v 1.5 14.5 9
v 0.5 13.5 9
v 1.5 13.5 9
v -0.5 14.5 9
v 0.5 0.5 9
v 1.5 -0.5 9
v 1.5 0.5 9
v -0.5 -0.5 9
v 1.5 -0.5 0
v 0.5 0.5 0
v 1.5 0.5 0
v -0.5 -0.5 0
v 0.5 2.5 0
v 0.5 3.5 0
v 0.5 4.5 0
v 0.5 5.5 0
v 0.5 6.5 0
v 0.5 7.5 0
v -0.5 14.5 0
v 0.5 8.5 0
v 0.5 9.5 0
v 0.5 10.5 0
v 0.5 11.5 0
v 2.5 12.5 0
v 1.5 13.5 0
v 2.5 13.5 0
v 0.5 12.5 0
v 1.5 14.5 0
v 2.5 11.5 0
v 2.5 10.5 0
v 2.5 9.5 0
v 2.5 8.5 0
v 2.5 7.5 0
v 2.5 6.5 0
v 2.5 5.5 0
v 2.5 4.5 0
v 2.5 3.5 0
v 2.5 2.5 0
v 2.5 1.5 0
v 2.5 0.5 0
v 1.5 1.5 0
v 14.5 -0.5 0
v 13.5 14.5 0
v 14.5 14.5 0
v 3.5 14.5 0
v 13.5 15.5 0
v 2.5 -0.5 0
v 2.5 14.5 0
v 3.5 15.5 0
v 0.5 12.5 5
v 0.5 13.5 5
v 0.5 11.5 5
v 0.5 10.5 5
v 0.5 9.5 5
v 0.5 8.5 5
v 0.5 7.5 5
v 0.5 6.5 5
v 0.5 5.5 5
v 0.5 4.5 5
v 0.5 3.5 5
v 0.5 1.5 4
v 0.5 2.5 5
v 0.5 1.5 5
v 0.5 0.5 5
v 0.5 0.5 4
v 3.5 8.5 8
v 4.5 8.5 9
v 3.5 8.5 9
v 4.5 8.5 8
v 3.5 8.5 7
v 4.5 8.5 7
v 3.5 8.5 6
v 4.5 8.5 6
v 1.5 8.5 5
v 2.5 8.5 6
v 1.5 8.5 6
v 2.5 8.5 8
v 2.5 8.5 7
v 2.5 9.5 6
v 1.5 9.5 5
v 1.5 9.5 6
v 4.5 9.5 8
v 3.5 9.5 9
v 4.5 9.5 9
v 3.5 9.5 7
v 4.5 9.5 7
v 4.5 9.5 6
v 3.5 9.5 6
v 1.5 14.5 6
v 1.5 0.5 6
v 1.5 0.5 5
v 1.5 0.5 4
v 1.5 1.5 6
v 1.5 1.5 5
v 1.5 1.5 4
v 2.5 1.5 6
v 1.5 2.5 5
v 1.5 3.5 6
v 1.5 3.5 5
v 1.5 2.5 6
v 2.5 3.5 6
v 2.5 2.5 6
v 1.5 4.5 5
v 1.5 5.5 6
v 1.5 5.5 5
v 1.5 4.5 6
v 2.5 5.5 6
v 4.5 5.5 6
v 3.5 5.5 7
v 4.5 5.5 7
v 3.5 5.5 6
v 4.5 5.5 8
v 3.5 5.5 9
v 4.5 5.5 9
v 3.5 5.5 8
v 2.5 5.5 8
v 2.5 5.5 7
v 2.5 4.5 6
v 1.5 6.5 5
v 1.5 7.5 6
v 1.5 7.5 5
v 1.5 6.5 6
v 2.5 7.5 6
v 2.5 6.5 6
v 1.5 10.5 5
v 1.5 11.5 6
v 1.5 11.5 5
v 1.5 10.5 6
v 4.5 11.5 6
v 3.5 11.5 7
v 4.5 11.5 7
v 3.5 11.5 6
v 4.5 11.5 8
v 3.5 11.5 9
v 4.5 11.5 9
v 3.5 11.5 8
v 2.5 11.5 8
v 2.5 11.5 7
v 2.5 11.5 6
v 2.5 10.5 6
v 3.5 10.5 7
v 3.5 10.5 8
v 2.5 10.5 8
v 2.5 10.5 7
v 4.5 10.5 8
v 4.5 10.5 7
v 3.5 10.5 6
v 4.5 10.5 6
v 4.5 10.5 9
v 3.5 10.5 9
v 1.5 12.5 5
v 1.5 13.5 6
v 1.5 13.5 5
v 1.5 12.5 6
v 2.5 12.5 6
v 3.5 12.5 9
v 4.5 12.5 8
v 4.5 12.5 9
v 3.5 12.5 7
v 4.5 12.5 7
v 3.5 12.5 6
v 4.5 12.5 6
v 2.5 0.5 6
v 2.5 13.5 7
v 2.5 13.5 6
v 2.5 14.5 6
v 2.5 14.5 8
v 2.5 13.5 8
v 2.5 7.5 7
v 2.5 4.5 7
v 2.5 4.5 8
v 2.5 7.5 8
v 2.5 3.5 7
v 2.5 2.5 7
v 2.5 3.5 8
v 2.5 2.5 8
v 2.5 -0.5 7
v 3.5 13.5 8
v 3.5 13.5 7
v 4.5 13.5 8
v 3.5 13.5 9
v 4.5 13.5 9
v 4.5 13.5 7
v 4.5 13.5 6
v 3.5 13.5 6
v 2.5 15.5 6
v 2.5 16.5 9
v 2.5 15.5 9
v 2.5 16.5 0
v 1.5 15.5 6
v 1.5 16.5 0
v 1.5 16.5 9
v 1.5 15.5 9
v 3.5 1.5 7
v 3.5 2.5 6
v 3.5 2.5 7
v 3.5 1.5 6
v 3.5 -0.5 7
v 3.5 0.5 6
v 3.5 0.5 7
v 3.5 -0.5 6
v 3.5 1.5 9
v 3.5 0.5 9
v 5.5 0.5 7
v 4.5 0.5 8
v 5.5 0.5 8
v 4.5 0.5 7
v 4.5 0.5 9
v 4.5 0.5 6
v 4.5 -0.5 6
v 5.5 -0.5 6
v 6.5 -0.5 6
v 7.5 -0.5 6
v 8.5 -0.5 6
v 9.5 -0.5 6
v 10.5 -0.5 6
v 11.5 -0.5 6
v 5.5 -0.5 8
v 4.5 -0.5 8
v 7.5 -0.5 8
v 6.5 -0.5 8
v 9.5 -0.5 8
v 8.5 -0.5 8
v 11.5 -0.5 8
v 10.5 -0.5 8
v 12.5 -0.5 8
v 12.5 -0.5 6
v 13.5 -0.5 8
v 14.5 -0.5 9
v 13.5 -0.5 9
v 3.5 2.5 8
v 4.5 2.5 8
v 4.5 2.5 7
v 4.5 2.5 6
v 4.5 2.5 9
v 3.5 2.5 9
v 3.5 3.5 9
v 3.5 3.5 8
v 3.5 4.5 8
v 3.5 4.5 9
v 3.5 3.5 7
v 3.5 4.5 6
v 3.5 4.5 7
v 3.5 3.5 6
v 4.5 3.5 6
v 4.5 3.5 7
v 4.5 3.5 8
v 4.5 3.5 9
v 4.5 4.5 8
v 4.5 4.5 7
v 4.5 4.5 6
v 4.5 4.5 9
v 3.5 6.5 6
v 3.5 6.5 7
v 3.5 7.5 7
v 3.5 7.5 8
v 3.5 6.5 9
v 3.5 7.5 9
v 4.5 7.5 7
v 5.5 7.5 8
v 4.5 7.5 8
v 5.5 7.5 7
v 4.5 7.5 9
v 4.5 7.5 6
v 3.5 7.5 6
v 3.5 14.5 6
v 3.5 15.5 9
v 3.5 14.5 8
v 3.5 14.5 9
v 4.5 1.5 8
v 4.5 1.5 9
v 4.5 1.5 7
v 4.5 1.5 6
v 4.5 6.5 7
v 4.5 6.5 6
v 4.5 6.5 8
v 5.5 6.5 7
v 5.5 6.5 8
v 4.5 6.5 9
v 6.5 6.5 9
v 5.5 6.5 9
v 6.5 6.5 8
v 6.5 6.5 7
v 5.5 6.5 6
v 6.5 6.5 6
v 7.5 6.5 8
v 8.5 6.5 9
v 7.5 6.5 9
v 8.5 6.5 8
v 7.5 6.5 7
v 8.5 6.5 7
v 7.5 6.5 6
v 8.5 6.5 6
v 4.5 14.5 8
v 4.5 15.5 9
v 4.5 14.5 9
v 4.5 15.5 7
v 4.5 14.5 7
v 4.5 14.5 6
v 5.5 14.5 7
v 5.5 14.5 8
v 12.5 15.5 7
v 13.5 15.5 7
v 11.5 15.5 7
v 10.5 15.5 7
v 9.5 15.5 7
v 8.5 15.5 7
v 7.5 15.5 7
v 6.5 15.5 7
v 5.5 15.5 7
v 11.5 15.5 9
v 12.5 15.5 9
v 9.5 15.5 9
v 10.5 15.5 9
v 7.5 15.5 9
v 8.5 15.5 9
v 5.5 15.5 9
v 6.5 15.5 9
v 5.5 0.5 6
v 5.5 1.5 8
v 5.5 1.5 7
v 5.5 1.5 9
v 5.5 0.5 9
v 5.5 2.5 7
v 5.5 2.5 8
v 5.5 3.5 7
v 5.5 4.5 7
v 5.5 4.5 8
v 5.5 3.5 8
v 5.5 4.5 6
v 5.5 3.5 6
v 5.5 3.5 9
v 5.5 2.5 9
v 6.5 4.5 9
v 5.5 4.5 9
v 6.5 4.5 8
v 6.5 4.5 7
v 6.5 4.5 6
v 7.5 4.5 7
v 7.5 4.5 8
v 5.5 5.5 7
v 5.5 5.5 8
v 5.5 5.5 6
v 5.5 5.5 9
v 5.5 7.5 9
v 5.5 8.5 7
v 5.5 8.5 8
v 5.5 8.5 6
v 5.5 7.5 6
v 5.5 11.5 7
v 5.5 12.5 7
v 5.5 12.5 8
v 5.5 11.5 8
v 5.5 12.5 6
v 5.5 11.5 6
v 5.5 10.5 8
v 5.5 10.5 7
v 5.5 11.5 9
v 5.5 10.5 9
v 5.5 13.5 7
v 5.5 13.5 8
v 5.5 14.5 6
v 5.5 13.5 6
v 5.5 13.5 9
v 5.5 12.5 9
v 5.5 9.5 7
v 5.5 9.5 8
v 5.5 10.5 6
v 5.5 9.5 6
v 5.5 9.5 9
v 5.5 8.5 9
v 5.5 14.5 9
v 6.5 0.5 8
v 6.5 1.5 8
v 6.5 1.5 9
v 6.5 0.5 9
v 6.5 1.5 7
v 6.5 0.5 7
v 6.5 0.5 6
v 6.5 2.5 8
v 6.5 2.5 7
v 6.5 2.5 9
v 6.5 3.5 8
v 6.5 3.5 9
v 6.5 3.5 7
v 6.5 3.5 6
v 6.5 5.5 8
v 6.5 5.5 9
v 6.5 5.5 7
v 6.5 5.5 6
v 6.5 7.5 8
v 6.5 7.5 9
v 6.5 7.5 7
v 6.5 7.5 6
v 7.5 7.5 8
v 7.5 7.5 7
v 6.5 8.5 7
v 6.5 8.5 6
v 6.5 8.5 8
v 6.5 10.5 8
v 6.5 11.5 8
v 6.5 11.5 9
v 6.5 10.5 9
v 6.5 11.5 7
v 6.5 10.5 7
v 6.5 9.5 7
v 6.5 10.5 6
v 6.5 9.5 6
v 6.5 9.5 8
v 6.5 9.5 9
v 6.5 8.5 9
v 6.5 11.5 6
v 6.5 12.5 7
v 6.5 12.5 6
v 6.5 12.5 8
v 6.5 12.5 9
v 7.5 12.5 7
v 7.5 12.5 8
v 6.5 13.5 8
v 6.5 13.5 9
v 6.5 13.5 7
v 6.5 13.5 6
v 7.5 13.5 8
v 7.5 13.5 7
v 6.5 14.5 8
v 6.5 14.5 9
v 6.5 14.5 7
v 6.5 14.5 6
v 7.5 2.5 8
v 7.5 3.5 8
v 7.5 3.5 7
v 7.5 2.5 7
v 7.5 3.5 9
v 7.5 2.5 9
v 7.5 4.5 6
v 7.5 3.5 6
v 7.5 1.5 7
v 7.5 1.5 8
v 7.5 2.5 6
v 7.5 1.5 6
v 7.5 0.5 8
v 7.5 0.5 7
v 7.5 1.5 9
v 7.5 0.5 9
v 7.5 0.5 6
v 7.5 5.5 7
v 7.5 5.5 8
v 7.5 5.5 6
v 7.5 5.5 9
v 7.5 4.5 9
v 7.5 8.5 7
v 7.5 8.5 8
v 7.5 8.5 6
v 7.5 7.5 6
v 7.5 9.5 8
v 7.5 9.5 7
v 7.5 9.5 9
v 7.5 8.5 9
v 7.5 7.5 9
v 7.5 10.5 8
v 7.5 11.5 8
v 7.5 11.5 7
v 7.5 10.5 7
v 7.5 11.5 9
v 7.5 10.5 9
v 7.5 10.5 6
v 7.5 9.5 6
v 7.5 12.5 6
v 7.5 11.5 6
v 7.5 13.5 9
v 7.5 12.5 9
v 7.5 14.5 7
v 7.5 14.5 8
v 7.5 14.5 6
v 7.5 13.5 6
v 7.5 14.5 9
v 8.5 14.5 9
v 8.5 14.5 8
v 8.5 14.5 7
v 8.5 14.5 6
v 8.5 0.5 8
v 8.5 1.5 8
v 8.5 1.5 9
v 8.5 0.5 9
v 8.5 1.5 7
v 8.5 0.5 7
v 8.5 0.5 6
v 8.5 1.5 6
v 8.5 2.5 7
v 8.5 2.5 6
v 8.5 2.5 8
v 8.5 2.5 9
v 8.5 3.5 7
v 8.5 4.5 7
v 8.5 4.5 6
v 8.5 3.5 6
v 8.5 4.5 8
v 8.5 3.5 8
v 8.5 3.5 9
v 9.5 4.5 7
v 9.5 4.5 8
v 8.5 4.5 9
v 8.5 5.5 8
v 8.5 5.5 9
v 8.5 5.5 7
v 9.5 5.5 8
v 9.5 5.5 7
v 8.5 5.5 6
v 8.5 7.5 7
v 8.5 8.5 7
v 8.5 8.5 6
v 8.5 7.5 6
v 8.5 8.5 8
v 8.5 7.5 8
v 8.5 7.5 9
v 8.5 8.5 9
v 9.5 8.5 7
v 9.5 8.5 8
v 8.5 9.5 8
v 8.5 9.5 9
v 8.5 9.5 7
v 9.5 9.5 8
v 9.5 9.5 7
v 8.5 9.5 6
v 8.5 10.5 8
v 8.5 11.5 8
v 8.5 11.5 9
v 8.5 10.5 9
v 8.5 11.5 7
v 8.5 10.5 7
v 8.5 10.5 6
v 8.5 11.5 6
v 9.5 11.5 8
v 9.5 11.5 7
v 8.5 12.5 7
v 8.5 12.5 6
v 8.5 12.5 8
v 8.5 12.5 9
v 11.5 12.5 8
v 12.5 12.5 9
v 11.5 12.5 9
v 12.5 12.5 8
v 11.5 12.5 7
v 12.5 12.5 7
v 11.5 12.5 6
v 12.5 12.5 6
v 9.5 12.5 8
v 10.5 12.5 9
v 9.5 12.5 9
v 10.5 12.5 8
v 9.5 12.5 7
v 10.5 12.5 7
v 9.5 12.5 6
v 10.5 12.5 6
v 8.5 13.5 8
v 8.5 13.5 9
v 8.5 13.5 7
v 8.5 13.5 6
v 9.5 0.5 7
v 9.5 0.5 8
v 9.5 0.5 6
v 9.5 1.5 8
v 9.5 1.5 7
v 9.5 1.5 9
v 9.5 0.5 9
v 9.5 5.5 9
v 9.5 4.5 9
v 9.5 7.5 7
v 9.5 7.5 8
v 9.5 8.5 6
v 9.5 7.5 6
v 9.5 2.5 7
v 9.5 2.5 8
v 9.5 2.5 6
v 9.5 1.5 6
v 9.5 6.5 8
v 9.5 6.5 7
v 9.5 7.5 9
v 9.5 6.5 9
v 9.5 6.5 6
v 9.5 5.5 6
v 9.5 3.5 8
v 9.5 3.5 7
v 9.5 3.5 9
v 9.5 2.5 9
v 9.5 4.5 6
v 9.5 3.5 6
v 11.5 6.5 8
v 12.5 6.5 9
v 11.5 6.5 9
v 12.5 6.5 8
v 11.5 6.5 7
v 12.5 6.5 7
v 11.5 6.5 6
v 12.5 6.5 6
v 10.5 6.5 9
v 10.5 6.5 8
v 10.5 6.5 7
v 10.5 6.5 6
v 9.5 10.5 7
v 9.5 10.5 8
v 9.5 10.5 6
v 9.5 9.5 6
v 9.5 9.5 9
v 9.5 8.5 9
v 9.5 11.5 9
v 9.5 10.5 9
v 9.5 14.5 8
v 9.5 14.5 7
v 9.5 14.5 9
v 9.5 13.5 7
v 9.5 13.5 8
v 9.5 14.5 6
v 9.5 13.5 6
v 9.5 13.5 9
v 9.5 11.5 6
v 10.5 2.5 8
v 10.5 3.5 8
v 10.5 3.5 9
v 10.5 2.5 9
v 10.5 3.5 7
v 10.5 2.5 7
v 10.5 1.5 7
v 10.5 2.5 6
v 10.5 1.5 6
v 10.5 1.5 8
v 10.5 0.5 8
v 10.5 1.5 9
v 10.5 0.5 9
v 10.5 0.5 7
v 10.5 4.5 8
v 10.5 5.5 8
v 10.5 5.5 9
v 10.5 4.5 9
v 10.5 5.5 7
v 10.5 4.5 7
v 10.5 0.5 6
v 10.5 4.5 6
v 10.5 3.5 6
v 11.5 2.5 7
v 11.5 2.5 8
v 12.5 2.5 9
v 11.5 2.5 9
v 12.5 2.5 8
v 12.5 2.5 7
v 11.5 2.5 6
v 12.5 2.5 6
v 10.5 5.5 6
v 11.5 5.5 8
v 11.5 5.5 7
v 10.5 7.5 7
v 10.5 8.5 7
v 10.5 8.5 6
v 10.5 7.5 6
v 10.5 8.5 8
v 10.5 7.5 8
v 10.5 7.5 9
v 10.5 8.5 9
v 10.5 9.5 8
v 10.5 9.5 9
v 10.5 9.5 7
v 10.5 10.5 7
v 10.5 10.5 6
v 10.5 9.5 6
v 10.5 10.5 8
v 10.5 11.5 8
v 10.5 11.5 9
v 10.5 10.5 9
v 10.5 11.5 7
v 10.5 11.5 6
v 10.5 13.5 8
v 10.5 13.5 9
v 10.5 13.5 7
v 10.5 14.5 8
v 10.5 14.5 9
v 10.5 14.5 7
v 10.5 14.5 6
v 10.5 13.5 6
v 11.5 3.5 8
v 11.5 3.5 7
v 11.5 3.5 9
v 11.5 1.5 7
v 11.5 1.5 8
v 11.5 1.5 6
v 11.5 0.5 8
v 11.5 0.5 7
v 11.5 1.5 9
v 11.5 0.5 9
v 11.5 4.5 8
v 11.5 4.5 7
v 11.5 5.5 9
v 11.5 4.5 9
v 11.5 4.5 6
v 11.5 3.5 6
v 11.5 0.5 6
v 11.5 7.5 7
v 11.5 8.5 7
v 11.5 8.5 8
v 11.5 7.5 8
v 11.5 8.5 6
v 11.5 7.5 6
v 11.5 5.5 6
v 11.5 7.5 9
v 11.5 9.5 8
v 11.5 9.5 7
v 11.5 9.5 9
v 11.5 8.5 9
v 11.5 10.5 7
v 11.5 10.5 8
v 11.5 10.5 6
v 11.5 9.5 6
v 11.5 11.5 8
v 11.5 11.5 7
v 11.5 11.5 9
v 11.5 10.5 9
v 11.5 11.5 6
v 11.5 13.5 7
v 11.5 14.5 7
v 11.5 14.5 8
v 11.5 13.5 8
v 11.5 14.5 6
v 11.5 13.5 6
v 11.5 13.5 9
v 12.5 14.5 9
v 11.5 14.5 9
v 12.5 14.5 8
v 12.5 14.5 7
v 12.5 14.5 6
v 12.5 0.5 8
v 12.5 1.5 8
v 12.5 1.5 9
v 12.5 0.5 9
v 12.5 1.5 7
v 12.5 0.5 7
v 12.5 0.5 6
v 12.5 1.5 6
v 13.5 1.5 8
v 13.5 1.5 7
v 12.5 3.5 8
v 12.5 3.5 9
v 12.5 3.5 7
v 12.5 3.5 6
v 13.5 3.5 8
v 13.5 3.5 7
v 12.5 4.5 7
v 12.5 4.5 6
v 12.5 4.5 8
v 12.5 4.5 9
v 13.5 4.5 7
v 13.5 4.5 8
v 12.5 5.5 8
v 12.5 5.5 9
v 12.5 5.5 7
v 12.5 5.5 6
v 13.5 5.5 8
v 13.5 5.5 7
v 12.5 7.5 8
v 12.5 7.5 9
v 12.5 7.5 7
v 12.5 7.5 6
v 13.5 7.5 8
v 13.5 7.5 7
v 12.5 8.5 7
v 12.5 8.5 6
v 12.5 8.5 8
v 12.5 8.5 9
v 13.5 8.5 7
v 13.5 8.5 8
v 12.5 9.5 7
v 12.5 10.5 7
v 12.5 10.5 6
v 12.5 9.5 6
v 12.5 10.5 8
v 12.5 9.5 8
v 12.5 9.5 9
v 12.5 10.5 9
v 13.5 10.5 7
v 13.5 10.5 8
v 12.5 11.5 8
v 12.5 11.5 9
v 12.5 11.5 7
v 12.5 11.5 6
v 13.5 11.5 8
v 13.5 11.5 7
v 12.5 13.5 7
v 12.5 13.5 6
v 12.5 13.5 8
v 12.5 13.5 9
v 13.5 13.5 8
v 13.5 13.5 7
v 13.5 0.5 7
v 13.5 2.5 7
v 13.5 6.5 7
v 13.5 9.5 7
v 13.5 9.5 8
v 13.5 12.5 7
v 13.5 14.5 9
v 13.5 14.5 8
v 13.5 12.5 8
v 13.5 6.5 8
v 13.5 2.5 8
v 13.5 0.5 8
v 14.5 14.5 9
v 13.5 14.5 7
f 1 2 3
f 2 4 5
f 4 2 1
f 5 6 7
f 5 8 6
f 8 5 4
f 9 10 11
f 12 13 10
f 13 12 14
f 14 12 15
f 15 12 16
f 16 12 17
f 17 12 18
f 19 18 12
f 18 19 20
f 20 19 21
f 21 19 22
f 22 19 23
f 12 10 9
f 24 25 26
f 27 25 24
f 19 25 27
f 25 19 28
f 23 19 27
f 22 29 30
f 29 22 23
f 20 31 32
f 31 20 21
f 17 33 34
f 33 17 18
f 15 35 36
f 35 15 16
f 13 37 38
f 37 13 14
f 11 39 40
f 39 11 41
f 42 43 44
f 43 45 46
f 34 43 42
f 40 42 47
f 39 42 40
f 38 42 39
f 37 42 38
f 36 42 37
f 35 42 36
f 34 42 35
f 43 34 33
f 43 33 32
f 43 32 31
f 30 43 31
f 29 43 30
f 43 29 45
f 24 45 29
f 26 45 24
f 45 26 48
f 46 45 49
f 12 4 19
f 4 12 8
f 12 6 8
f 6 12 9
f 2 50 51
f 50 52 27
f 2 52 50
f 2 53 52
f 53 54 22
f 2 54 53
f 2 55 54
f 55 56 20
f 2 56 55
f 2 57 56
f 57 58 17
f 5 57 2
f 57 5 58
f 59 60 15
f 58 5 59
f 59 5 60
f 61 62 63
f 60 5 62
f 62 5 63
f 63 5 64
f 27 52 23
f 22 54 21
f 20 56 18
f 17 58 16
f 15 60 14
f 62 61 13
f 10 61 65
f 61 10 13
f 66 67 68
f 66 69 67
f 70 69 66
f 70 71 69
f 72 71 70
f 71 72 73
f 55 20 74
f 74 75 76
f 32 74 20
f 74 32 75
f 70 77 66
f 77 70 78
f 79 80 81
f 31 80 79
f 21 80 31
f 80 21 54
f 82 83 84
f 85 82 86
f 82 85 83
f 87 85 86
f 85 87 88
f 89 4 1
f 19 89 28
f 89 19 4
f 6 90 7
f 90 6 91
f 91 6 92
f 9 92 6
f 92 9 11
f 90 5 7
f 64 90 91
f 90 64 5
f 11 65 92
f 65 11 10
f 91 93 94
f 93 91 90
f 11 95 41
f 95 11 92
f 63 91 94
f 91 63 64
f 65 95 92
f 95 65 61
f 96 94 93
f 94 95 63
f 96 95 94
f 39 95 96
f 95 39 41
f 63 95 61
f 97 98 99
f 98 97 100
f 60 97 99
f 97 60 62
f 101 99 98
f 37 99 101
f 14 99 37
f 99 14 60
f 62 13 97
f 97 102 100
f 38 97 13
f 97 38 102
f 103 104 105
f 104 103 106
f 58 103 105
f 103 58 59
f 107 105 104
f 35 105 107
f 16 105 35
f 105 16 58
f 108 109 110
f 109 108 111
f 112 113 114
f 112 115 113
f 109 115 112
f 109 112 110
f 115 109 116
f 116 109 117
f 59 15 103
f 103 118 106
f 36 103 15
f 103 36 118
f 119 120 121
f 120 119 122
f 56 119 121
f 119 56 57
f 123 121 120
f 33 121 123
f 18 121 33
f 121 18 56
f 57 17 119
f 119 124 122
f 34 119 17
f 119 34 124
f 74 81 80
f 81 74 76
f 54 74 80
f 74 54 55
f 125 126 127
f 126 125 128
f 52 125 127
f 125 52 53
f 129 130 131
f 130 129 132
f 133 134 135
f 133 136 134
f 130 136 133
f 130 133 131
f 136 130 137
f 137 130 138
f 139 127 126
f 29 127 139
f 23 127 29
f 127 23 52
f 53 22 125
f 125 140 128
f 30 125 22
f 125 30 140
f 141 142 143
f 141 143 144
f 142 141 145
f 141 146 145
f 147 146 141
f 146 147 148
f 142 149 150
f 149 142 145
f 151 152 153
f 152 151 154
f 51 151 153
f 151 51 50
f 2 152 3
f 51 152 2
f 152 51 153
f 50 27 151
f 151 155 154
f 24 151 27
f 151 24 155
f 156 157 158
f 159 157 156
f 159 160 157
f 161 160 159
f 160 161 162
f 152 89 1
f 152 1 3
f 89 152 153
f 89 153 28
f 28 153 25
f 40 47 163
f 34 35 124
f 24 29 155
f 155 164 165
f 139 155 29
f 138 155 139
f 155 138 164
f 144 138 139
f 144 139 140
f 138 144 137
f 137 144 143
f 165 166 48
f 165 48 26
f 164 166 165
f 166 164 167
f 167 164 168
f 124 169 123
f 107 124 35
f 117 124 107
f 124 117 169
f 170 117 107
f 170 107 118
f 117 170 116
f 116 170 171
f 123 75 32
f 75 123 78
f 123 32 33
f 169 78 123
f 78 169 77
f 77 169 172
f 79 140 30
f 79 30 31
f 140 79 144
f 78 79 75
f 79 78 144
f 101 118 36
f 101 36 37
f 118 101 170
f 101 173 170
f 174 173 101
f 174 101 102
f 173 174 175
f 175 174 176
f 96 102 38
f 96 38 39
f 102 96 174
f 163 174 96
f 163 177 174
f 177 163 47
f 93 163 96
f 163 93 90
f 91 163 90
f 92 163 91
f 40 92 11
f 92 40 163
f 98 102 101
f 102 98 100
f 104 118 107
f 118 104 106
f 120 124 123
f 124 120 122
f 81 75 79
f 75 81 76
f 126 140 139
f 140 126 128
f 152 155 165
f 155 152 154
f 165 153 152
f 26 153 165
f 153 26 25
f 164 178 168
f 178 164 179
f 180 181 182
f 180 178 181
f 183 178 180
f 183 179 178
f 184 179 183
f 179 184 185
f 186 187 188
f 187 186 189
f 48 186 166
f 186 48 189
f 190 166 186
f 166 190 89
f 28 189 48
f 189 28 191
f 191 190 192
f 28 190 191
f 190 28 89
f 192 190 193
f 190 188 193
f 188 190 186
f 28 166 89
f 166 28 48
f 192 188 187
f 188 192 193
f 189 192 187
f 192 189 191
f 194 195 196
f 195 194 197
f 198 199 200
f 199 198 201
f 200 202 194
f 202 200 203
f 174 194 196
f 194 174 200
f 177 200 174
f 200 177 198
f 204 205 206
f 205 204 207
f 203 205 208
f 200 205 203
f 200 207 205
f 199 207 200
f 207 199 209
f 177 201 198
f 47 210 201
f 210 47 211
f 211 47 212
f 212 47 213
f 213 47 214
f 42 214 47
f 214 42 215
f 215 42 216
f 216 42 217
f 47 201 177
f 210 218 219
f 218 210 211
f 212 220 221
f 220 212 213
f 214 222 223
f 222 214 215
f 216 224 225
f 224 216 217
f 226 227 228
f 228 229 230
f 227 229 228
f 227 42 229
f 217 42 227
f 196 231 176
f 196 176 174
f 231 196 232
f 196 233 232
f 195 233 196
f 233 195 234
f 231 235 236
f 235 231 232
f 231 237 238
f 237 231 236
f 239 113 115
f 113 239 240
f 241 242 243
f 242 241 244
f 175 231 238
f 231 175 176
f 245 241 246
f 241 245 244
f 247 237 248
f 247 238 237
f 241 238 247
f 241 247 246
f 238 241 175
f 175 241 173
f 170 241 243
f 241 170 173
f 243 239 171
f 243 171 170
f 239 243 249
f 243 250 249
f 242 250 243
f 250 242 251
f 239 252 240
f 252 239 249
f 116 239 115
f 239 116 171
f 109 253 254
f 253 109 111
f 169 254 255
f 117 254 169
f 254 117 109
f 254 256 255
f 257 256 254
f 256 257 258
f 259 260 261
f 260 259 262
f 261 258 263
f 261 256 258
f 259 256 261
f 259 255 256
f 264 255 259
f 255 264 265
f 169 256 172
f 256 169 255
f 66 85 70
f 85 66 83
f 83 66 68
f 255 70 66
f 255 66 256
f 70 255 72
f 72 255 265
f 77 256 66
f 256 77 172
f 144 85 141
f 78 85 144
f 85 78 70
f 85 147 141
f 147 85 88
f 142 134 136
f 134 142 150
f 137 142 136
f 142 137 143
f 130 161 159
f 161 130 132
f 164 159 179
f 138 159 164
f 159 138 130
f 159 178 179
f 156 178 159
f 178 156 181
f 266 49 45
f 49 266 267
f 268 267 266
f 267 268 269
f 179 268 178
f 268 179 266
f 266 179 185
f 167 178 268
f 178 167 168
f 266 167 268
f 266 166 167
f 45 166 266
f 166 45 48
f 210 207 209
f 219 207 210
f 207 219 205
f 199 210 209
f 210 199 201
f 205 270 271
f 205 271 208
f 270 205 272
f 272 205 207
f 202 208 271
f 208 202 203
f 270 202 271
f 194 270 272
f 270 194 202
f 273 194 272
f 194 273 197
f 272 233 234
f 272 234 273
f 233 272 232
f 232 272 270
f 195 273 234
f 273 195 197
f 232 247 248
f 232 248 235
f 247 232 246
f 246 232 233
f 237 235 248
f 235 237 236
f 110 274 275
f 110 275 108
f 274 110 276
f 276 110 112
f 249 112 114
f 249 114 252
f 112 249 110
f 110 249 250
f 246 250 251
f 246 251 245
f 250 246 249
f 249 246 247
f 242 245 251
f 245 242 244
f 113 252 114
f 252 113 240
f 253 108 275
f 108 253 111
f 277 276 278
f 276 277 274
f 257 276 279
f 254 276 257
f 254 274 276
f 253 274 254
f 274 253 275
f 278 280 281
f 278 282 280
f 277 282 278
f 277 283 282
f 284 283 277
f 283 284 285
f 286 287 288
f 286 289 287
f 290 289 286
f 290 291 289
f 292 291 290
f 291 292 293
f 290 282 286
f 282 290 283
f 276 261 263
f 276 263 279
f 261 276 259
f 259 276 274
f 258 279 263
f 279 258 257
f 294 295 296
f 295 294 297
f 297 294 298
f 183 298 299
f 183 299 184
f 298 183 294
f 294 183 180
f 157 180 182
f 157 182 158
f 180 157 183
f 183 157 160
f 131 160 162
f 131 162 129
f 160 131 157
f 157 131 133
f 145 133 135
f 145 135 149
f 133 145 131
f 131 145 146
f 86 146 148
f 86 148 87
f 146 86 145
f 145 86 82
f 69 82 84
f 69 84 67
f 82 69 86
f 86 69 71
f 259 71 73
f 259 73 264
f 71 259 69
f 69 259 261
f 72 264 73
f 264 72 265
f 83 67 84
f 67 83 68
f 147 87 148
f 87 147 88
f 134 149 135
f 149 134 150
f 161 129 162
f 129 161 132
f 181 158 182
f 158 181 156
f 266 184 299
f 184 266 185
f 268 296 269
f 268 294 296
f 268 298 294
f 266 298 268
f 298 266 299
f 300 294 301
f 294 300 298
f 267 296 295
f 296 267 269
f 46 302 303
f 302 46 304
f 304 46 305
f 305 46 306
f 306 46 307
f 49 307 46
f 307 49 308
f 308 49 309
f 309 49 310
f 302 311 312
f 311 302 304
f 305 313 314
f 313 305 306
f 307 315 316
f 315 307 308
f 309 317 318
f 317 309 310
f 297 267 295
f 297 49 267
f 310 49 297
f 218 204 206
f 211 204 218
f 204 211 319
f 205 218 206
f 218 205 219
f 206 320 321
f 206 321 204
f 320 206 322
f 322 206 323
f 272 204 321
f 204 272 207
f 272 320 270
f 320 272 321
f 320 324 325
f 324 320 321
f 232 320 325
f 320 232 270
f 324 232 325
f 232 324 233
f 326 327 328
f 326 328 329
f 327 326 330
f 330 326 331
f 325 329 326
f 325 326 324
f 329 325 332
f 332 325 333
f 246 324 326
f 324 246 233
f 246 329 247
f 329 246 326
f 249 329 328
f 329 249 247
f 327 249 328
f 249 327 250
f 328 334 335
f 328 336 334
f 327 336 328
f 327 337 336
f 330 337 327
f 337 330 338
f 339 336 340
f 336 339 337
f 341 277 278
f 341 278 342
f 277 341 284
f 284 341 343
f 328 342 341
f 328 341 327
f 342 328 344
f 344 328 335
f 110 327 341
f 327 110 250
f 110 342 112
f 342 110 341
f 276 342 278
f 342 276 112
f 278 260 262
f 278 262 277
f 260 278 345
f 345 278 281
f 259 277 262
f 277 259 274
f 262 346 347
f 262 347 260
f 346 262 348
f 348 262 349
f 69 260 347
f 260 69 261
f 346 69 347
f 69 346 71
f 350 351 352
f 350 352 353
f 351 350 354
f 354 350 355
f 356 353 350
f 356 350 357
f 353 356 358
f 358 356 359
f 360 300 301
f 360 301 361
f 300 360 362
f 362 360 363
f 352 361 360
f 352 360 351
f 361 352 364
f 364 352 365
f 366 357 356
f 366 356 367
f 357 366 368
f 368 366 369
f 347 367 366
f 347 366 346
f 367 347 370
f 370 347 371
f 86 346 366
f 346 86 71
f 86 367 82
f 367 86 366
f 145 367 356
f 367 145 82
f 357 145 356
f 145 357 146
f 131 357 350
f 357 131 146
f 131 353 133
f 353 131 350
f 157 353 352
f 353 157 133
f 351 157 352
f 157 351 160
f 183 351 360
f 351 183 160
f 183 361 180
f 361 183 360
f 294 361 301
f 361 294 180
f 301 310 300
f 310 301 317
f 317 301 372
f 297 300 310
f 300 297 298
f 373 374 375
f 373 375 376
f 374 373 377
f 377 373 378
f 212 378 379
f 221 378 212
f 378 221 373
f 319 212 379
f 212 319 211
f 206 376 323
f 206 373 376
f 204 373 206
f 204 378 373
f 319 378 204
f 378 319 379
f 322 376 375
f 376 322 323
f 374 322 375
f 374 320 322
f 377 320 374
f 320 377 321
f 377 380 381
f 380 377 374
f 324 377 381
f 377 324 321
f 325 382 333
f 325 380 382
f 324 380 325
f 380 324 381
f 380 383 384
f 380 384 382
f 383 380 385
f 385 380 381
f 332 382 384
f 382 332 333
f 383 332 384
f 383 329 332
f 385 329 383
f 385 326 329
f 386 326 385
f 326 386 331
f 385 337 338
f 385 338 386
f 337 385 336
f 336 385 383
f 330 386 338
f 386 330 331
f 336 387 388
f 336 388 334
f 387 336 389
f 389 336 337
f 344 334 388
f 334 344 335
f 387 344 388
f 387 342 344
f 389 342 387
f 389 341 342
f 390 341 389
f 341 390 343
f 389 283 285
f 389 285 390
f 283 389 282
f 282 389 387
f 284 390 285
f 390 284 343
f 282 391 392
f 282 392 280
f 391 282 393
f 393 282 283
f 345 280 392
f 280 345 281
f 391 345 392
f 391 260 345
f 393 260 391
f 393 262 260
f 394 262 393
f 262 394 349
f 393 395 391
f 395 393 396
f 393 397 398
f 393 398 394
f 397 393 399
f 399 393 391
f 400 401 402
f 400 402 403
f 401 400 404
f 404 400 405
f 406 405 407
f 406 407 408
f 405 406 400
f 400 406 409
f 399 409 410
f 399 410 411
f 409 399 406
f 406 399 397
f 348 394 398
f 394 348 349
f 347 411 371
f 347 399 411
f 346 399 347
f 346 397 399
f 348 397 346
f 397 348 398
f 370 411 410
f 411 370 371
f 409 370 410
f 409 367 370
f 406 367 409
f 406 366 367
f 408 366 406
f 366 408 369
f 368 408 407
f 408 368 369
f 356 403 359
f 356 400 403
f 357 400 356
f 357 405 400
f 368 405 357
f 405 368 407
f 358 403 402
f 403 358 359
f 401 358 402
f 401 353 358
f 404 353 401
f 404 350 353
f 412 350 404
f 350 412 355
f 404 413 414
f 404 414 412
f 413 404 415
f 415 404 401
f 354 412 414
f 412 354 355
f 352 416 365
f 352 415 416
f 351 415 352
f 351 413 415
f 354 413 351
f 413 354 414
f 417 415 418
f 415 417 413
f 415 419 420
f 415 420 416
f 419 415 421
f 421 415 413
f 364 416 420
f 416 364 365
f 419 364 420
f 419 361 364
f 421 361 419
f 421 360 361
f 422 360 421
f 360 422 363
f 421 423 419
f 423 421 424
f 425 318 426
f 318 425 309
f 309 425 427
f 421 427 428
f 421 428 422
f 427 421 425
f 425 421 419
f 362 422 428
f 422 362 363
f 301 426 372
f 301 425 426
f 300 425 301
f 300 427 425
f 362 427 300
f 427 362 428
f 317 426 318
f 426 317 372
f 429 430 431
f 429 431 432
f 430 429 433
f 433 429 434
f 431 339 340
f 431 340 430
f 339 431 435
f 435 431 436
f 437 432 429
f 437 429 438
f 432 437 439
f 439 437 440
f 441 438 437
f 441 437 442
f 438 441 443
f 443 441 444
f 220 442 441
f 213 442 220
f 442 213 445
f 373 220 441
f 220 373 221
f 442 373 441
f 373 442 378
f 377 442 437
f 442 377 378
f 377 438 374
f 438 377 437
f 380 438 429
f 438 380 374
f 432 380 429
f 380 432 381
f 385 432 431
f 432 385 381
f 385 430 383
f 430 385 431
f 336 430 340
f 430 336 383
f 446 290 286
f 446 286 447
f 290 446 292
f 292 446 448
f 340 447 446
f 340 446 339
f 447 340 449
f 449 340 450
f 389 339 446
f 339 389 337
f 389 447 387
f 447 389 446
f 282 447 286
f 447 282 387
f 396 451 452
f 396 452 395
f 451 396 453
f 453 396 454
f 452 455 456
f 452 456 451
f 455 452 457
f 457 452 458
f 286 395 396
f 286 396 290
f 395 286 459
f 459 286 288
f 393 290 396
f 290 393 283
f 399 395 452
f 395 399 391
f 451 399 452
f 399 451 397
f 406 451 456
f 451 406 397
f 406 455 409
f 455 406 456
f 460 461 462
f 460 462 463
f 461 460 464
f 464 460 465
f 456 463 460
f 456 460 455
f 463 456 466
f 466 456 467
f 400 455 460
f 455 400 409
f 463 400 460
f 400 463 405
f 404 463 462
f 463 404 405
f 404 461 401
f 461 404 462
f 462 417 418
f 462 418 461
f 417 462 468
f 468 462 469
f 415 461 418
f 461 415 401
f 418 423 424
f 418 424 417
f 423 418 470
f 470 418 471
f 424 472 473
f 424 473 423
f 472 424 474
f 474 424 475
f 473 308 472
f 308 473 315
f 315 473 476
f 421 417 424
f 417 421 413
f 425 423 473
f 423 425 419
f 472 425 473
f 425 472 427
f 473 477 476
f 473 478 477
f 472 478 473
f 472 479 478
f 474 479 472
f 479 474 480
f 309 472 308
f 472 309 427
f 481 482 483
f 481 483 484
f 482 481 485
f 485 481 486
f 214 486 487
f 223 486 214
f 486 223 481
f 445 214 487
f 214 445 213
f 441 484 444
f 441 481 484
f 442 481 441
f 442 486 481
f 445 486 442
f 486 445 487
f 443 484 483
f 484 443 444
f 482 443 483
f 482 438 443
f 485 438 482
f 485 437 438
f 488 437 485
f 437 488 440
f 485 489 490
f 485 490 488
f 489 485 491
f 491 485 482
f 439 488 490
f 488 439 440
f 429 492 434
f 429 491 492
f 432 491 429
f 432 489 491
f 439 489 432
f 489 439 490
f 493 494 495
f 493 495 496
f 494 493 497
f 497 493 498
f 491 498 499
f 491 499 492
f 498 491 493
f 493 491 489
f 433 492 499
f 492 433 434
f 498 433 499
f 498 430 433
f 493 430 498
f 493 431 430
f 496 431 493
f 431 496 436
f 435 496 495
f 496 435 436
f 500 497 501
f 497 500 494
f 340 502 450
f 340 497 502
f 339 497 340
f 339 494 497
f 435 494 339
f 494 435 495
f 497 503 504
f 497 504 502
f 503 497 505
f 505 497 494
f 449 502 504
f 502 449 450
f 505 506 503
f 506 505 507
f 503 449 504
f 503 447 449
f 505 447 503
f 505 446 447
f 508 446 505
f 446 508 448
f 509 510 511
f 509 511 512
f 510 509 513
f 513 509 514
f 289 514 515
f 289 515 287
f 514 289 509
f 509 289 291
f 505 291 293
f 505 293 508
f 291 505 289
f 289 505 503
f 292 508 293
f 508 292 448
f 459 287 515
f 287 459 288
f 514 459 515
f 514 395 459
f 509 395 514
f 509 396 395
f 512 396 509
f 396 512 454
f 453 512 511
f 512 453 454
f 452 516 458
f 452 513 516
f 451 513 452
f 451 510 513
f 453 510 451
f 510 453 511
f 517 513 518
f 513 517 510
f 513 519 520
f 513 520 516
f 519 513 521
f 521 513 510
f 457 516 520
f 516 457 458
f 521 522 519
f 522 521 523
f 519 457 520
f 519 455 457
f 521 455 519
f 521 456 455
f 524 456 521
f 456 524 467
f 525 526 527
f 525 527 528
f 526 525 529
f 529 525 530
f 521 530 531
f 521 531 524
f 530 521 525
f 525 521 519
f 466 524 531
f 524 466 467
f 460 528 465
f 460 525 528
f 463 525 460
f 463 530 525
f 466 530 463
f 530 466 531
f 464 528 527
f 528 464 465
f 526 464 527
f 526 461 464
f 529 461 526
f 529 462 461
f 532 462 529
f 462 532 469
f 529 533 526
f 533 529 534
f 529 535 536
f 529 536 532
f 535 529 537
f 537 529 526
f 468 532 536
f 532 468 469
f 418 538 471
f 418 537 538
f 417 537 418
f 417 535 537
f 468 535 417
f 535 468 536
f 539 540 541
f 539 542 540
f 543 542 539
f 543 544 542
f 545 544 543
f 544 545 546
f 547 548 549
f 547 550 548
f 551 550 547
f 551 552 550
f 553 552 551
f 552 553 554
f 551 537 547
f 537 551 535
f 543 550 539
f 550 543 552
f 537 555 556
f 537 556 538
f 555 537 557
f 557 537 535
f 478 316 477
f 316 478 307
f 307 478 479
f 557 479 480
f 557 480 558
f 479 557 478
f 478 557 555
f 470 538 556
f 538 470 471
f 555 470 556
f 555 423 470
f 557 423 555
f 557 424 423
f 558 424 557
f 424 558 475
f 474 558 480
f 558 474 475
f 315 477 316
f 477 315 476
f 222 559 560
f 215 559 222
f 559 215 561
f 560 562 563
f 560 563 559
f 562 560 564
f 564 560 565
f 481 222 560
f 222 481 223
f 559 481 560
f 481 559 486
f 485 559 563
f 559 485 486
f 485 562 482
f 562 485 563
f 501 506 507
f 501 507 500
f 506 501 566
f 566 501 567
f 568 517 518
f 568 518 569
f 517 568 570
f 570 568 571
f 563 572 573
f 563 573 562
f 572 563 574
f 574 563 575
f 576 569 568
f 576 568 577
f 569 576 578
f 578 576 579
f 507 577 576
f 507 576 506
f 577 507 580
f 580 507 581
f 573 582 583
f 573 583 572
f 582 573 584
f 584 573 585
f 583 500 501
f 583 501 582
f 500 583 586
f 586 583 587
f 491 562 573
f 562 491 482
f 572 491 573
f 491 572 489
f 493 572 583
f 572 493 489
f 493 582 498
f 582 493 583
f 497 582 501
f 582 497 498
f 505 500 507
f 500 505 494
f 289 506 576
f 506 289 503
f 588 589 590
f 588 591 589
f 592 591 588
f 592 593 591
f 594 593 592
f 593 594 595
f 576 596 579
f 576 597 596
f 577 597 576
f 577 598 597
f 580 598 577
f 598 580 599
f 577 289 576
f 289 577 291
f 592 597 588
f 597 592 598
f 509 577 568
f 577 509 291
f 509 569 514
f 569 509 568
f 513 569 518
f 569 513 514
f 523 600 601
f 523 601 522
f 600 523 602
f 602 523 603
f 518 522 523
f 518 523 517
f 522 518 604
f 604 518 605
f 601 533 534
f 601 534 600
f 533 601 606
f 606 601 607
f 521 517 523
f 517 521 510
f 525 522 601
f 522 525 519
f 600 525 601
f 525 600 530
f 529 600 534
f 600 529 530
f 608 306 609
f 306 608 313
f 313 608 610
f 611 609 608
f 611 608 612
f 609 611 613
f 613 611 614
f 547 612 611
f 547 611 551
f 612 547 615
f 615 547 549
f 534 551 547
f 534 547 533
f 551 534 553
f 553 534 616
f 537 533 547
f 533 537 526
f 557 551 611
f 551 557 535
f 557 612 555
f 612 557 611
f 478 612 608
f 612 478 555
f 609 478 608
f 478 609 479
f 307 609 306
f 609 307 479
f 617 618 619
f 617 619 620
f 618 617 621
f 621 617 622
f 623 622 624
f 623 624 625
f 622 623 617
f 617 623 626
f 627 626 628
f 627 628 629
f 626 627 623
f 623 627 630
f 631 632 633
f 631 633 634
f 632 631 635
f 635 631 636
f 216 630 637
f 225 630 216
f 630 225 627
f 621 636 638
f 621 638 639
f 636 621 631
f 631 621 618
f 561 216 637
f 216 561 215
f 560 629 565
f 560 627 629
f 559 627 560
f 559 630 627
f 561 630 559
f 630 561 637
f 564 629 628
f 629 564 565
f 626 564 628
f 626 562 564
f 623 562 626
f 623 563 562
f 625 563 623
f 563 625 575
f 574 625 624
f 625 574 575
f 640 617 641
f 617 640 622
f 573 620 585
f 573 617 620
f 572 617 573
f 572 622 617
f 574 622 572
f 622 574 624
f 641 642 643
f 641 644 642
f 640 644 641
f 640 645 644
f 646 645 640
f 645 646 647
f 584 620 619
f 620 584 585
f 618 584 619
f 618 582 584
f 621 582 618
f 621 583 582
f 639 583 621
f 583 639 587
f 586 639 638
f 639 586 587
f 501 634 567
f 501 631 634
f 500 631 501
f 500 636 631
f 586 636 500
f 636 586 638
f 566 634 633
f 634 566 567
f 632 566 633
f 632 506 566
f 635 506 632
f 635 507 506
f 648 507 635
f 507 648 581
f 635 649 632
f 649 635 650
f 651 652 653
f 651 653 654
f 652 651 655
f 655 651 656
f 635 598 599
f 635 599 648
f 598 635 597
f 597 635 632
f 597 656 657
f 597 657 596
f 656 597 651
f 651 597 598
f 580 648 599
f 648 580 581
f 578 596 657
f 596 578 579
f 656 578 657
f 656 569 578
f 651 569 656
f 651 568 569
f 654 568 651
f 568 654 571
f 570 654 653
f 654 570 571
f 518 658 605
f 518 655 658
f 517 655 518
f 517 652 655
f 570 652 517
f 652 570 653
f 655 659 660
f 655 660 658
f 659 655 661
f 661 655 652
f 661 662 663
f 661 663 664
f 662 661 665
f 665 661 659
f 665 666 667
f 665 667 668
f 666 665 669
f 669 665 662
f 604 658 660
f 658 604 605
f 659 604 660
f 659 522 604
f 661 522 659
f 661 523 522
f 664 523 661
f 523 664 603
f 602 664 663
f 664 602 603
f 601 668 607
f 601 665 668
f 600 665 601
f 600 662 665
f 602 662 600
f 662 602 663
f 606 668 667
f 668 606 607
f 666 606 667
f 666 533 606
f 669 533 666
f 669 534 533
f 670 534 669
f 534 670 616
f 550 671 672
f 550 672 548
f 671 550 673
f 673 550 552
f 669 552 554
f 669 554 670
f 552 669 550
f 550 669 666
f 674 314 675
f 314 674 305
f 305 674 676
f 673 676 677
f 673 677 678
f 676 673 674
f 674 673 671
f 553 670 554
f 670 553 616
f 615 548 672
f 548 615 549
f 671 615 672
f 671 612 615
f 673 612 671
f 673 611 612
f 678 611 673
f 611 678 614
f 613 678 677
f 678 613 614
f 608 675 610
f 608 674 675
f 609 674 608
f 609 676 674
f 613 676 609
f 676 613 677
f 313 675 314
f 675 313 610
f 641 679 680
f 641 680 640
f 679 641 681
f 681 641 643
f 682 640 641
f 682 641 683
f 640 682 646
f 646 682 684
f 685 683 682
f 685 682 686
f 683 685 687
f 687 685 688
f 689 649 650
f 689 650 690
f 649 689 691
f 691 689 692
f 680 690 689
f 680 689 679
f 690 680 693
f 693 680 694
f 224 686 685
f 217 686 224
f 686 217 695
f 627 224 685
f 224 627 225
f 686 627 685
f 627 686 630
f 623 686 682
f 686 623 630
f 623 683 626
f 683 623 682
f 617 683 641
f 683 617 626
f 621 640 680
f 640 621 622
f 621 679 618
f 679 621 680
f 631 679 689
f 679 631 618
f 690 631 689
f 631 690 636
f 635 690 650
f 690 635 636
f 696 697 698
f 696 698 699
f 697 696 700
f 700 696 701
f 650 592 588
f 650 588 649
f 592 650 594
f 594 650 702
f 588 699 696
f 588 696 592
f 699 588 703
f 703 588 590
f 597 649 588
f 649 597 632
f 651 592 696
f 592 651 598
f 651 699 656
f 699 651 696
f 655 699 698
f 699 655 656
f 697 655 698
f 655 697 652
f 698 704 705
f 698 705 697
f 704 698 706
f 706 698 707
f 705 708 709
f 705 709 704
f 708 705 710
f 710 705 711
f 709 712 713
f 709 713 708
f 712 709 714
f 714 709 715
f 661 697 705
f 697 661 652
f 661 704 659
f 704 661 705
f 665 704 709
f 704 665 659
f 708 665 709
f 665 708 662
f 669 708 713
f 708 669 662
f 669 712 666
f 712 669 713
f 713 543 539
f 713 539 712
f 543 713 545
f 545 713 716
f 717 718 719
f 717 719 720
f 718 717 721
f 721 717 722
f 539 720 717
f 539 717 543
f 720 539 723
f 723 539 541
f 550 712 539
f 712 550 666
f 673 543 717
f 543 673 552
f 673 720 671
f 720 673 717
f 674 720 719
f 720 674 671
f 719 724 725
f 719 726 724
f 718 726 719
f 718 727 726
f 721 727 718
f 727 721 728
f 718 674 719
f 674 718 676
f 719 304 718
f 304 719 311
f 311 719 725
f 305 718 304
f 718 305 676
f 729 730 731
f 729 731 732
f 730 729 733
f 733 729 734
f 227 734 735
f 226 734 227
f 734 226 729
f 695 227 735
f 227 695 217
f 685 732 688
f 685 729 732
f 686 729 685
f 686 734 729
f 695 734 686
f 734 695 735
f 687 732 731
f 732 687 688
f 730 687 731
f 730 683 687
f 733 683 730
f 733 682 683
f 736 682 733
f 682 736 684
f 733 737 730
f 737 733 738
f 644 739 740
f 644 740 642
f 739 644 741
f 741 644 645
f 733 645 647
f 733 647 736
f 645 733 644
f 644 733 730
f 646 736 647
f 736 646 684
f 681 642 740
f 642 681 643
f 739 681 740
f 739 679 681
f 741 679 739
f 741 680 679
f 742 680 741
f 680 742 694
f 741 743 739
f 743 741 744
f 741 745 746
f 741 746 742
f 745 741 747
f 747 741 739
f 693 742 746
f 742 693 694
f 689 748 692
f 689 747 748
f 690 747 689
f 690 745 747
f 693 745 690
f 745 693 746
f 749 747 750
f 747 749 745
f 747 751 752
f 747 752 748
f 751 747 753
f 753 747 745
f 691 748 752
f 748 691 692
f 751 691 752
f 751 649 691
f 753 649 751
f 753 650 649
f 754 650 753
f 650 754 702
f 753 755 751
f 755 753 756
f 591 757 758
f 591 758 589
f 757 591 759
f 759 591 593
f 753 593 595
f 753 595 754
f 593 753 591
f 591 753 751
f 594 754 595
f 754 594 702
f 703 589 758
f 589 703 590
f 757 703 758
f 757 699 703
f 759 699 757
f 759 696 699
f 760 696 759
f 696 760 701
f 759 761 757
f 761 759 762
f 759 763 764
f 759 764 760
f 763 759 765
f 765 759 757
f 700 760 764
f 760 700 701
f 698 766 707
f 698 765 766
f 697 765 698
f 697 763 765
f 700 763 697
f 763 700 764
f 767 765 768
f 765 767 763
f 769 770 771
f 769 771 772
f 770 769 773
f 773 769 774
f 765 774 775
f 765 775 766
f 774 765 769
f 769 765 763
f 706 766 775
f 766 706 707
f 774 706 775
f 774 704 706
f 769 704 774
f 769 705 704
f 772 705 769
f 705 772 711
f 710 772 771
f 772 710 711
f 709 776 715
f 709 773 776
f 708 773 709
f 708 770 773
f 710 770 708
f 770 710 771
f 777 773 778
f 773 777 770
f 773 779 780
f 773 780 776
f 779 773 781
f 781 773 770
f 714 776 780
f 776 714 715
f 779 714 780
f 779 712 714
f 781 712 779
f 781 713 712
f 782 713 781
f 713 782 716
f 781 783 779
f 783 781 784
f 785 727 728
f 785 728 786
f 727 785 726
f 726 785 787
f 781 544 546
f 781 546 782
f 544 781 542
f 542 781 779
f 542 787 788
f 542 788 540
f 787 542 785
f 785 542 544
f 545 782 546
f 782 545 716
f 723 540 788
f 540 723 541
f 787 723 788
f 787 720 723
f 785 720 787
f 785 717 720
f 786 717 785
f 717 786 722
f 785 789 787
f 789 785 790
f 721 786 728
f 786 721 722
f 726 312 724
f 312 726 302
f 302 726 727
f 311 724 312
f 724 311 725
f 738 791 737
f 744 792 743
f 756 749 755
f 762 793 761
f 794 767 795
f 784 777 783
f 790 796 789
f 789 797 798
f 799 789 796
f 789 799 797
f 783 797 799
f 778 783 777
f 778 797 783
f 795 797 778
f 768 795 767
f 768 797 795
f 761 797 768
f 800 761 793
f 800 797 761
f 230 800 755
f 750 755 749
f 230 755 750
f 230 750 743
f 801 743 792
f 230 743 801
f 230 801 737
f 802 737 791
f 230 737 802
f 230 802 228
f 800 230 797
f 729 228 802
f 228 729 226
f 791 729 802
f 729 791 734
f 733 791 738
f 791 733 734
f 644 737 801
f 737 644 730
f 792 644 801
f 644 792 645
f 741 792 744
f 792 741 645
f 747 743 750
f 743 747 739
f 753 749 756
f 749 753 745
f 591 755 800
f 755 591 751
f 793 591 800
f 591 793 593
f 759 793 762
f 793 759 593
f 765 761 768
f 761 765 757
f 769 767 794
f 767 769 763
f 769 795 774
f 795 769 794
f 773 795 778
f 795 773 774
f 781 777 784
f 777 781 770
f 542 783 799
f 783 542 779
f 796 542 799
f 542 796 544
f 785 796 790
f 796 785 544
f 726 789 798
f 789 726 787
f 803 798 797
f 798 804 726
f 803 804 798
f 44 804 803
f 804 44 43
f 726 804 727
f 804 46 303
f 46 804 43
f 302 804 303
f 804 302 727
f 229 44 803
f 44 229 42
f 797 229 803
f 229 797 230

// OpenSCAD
union() {
    translate([0, 0, 4.5]) cube([1, 1, 9], center=true);
    translate([0, 1, 4.5]) cube([1, 1, 9], center=true);
    translate([0, 2, 4.5]) cube([1, 1, 9], center=true);
    translate([0, 3, 4.5]) cube([1, 1, 9], center=true);
    translate([0, 4, 4.5]) cube([1, 1, 9], center=true);
    translate([0, 5, 4.5]) cube([1, 1, 9], center=true);
    translate([0, 6, 4.5]) cube([1, 1, 9], center=true);
    translate([0, 7, 4.5]) cube([1, 1, 9], center=true);
    translate([0, 8, 4.5]) cube([1, 1, 9], center=true);
    translate([0, 9, 4.5]) cube([1, 1, 9], center=true);
    translate([0, 10, 4.5]) cube([1, 1, 9], center=true);
    translate([0, 11, 4.5]) cube([1, 1, 9], center=true);
    translate([0, 12, 4.5]) cube([1, 1, 9], center=true);
    translate([0, 13, 4.5]) cube([1, 1, 9], center=true);
    translate([0, 14, 4.5]) cube([1, 1, 9], center=true);
    translate([1, 0, 4.5]) cube([1, 1, 9], center=true);
    translate([1, 1, 4.5]) color([1, 0, 0]) cube([1, 1, 1], center=true);
    translate([1, 3, 2.5]) cube([1, 1, 5], center=true);
    translate([1, 5, 2.5]) cube([1, 1, 5], center=true);
    translate([1, 7, 2.5]) cube([1, 1, 5], center=true);
    translate([1, 9, 2.5]) cube([1, 1, 5], center=true);
    translate([1, 11, 2.5]) cube([1, 1, 5], center=true);
    translate([1, 13, 2.5]) cube([1, 1, 5], center=true);
    translate([1, 14, 4.5]) cube([1, 1, 9], center=true);
    translate([2, 1, 3.0]) cube([1, 1, 6], center=true);
    translate([2, 3, 3.0]) cube([1, 1, 6], center=true);
    translate([2, 5, 3.0]) cube([1, 1, 6], center=true);
    translate([2, 7, 3.0]) cube([1, 1, 6], center=true);
    translate([2, 9, 3.0]) cube([1, 1, 6], center=true);
    translate([2, 11, 3.0]) cube([1, 1, 6], center=true);
    translate([2, 13, 3.0]) cube([1, 1, 6], center=true);
    translate([2, 15, 3.0]) cube([1, 1, 6], center=true);
    translate([2, 16, 4.5]) cube([1, 1, 9], center=true);
    translate([3, 0, 3.5]) cube([1, 1, 7], center=true);
    translate([3, 1, 3.5]) cube([1, 1, 7], center=true);
    translate([3, 2, 3.5]) cube([1, 1, 7], center=true);
    translate([3, 3, 4.0]) cube([1, 1, 8], center=true);
    translate([3, 4, 3.5]) cube([1, 1, 7], center=true);
    translate([3, 5, 4.0]) cube([1, 1, 8], center=true);
    translate([3, 6, 3.5]) cube([1, 1, 7], center=true);
    translate([3, 7, 3.5]) cube([1, 1, 7], center=true);
    translate([3, 8, 4.0]) cube([1, 1, 8], center=true);
    translate([3, 9, 3.5]) cube([1, 1, 7], center=true);
    translate([3, 10, 3.5]) cube([1, 1, 7], center=true);
    translate([3, 11, 4.0]) cube([1, 1, 8], center=true);
    translate([3, 12, 3.5]) cube([1, 1, 7], center=true);
    translate([3, 13, 3.5]) cube([1, 1, 7], center=true);
    translate([3, 14, 4.0]) cube([1, 1, 8], center=true);
    translate([4, 0, 3.0]) cube([1, 1, 6], center=true);
    translate([4, 1, 4.5]) cube([1, 1, 9], center=true);
    translate([4, 2, 3.0]) cube([1, 1, 6], center=true);
    translate([4, 3, 4.5]) cube([1, 1, 9], center=true);
    translate([4, 4, 3.0]) cube([1, 1, 6], center=true);
    translate([4, 5, 4.5]) cube([1, 1, 9], center=true);
    translate([4, 6, 3.0]) cube([1, 1, 6], center=true);
    translate([4, 7, 4.5]) cube([1, 1, 9], center=true);
    translate([4, 8, 3.0]) cube([1, 1, 6], center=true);
    translate([4, 9, 4.5]) cube([1, 1, 9], center=true);
    translate([4, 10, 3.0]) cube([1, 1, 6], center=true);
    translate([4, 11, 4.5]) cube([1, 1, 9], center=true);
    translate([4, 12, 3.0]) cube([1, 1, 6], center=true);
    translate([4, 13, 4.5]) cube([1, 1, 9], center=true);
    translate([4, 14, 3.0]) cube([1, 1, 6], center=true);
    translate([4, 15, 4.5]) cube([1, 1, 9], center=true);
    translate([5, 0, 4.0]) cube([1, 1, 8], center=true);
    translate([5, 1, 3.5]) cube([1, 1, 7], center=true);
    translate([5, 2, 4.0]) cube([1, 1, 8], center=true);
    translate([5, 3, 3.5]) cube([1, 1, 7], center=true);
    translate([5, 4, 4.0]) cube([1, 1, 8], center=true);
    translate([5, 5, 3.5]) cube([1, 1, 7], center=true);
    translate([5, 6, 4.0]) cube([1, 1, 8], center=true);
    translate([5, 7, 3.5]) cube([1, 1, 7], center=true);
    translate([5, 8, 4.0]) cube([1, 1, 8], center=true);
    translate([5, 9, 3.5]) cube([1, 1, 7], center=true);
    translate([5, 10, 4.0]) cube([1, 1, 8], center=true);
    translate([5, 11, 3.5]) cube([1, 1, 7], center=true);
    translate([5, 12, 4.0]) cube([1, 1, 8], center=true);
    translate([5, 13, 3.5]) cube([1, 1, 7], center=true);
    translate([5, 14, 4.0]) cube([1, 1, 8], center=true);
    translate([5, 15, 3.5]) cube([1, 1, 7], center=true);
    translate([6, 0, 3.0]) cube([1, 1, 6], center=true);
    translate([6, 1, 4.5]) cube([1, 1, 9], center=true);
    translate([6, 2, 3.5]) cube([1, 1, 7], center=true);
    translate([6, 3, 4.5]) cube([1, 1, 9], center=true);
    translate([6, 4, 3.0]) cube([1, 1, 6], center=true);
    translate([6, 5, 4.5]) cube([1, 1, 9], center=true);
    translate([6, 6, 3.0]) cube([1, 1, 6], center=true);
    translate([6, 7, 4.5]) cube([1, 1, 9], center=true);
    translate([6, 8, 3.0]) cube([1, 1, 6], center=true);
    translate([6, 9, 4.5]) cube([1, 1, 9], center=true);
    translate([6, 10, 3.0]) cube([1, 1, 6], center=true);
    translate([6, 11, 4.5]) cube([1, 1, 9], center=true);
    translate([6, 12, 3.0]) cube([1, 1, 6], center=true);
    translate([6, 13, 4.5]) cube([1, 1, 9], center=true);
    translate([6, 14, 3.0]) cube([1, 1, 6], center=true);
    translate([6, 15, 4.5]) cube([1, 1, 9], center=true);
    translate([7, 0, 4.0]) cube([1, 1, 8], center=true);
    translate([7, 1, 3.5]) cube([1, 1, 7], center=true);
    translate([7, 2, 4.0]) cube([1, 1, 8], center=true);
    translate([7, 3, 3.5]) cube([1, 1, 7], center=true);
    translate([7, 4, 4.0]) cube([1, 1, 8], center=true);
    translate([7, 5, 3.5]) cube([1, 1, 7], center=true);
    translate([7, 6, 4.0]) cube([1, 1, 8], center=true);
    translate([7, 7, 3.5]) cube([1, 1, 7], center=true);
    translate([7, 8, 4.0]) cube([1, 1, 8], center=true);
    translate([7, 9, 3.5]) cube([1, 1, 7], center=true);
    translate([7, 10, 4.0]) cube([1, 1, 8], center=true);
    translate([7, 11, 3.5]) cube([1, 1, 7], center=true);
    translate([7, 12, 4.0]) cube([1, 1, 8], center=true);
    translate([7, 13, 3.5]) cube([1, 1, 7], center=true);
    translate([7, 14, 4.0]) cube([1, 1, 8], center=true);
    translate([7, 15, 3.5]) cube([1, 1, 7], center=true);
    translate([8, 0, 3.0]) cube([1, 1, 6], center=true);
    translate([8, 1, 4.5]) cube([1, 1, 9], center=true);
    translate([8, 2, 3.0]) cube([1, 1, 6], center=true);
    translate([8, 3, 4.5]) cube([1, 1, 9], center=true);
    translate([8, 4, 3.0]) cube([1, 1, 6], center=true);
    translate([8, 5, 4.5]) cube([1, 1, 9], center=true);
    translate([8, 6, 3.0]) cube([1, 1, 6], center=true);
    translate([8, 7, 4.5]) cube([1, 1, 9], center=true);
    translate([8, 8, 3.0]) cube([1, 1, 6], center=true);
    translate([8, 9, 4.5]) cube([1, 1, 9], center=true);
    translate([8, 10, 3.0]) cube([1, 1, 6], center=true);
    translate([8, 11, 4.5]) cube([1, 1, 9], center=true);
    translate([8, 12, 3.0]) cube([1, 1, 6], center=true);
    translate([8, 13, 4.5]) cube([1, 1, 9], center=true);
    translate([8, 14, 3.0]) cube([1, 1, 6], center=true);
    translate([8, 15, 4.5]) cube([1, 1, 9], center=true);
    translate([9, 0, 4.0]) cube([1, 1, 8], center=true);
    translate([9, 1, 3.5]) cube([1, 1, 7], center=true);
    translate([9, 2, 4.0]) cube([1, 1, 8], center=true);
    translate([9, 3, 3.5]) cube([1, 1, 7], center=true);
    translate([9, 4, 4.0]) cube([1, 1, 8], center=true);
    translate([9, 5, 3.5]) cube([1, 1, 7], center=true);
    translate([9, 6, 4.0]) cube([1, 1, 8], center=true);
    translate([9, 7, 3.5]) cube([1, 1, 7], center=true);
    translate([9, 8, 4.0]) cube([1, 1, 8], center=true);
    translate([9, 9, 3.5]) cube([1, 1, 7], center=true);
    translate([9, 10, 4.0]) cube([1, 1, 8], center=true);
    translate([9, 11, 3.5]) cube([1, 1, 7], center=true);
    translate([9, 12, 4.0]) cube([1, 1, 8], center=true);
    translate([9, 13, 3.5]) cube([1, 1, 7], center=true);
    translate([9, 14, 4.0]) cube([1, 1, 8], center=true);
    translate([9, 15, 3.5]) cube([1, 1, 7], center=true);
    translate([10, 0, 3.0]) cube([1, 1, 6], center=true);
    translate([10, 1, 4.5]) cube([1, 1, 9], center=true);
    translate([10, 2, 3.0]) cube([1, 1, 6], center=true);
    translate([10, 3, 4.5]) cube([1, 1, 9], center=true);
    translate([10, 4, 3.0]) cube([1, 1, 6], center=true);
    translate([10, 5, 4.5]) cube([1, 1, 9], center=true);
    translate([10, 6, 3.0]) cube([1, 1, 6], center=true);
    translate([10, 7, 4.5]) cube([1, 1, 9], center=true);
    translate([10, 8, 3.0]) cube([1, 1, 6], center=true);
    translate([10, 9, 4.5]) cube([1, 1, 9], center=true);
    translate([10, 10, 3.0]) cube([1, 1, 6], center=true);
    translate([10, 11, 4.5]) cube([1, 1, 9], center=true);
    translate([10, 12, 3.0]) cube([1, 1, 6], center=true);
    translate([10, 13, 4.5]) cube([1, 1, 9], center=true);
    translate([10, 14, 3.0]) cube([1, 1, 6], center=true);
    translate([10, 15, 4.5]) cube([1, 1, 9], center=true);
    translate([11, 0, 4.0]) cube([1, 1, 8], center=true);
    translate([11, 1, 3.5]) cube([1, 1, 7], center=true);
    translate([11, 2, 4.0]) cube([1, 1, 8], center=true);
    translate([11, 3, 3.5]) cube([1, 1, 7], center=true);
    translate([11, 4, 4.0]) cube([1, 1, 8], center=true);
    translate([11, 5, 3.5]) cube([1, 1, 7], center=true);
    translate([11, 6, 4.0]) cube([1, 1, 8], center=true);
    translate([11, 7, 3.5]) cube([1, 1, 7], center=true);
    translate([11, 8, 4.0]) cube([1, 1, 8], center=true);
    translate([11, 9, 3.5]) cube([1, 1, 7], center=true);
    translate([11, 10, 4.0]) cube([1, 1, 8], center=true);
    translate([11, 11, 3.5]) cube([1, 1, 7], center=true);
    translate([11, 12, 4.0]) cube([1, 1, 8], center=true);
    translate([11, 13, 3.5]) cube([1, 1, 7], center=true);
    translate([11, 14, 4.0]) cube([1, 1, 8], center=true);
    translate([11, 15, 3.5]) cube([1, 1, 7], center=true);
    translate([12, 0, 3.0]) cube([1, 1, 6], center=true);
    translate([12, 1, 4.5]) cube([1, 1, 9], center=true);
    translate([12, 2, 3.0]) cube([1, 1, 6], center=true);
    translate([12, 3, 4.5]) cube([1, 1, 9], center=true);
    translate([12, 4, 3.0]) cube([1, 1, 6], center=true);
    translate([12, 5, 4.5]) cube([1, 1, 9], center=true);
    translate([12, 6, 3.0]) cube([1, 1, 6], center=true);
    translate([12, 7, 4.5]) cube([1, 1, 9], center=true);
    translate([12, 8, 3.0]) cube([1, 1, 6], center=true);
    translate([12, 9, 4.5]) cube([1, 1, 9], center=true);
    translate([12, 10, 3.0]) cube([1, 1, 6], center=true);
    translate([12, 11, 4.5]) cube([1, 1, 9], center=true);
    translate([12, 12, 3.0]) cube([1, 1, 6], center=true);
    translate([12, 13, 4.5]) cube([1, 1, 9], center=true);
    translate([12, 14, 3.0]) cube([1, 1, 6], center=true);
    translate([12, 15, 4.5]) cube([1, 1, 9], center=true);
    translate([13, 0, 4.0]) cube([1, 1, 8], center=true);
    translate([13, 1, 3.5]) cube([1, 1, 7], center=true);
    translate([13, 2, 4.0]) cube([1, 1, 8], center=true);
    translate([13, 3, 3.5]) cube([1, 1, 7], center=true);
    translate([13, 4, 4.0]) cube([1, 1, 8], center=true);
    translate([13, 5, 3.5]) cube([1, 1, 7], center=true);
    translate([13, 6, 4.0]) cube([1, 1, 8], center=true);
    translate([13, 7, 3.5]) cube([1, 1, 7], center=true);
    translate([13, 8, 4.0]) cube([1, 1, 8], center=true);
    translate([13, 9, 3.5]) cube([1, 1, 7], center=true);
    translate([13, 10, 4.0]) cube([1, 1, 8], center=true);
    translate([13, 11, 3.5]) cube([1, 1, 7], center=true);
    translate([13, 12, 4.0]) cube([1, 1, 8], center=true);
    translate([13, 13, 3.5]) cube([1, 1, 7], center=true);
    translate([13, 14, 4.0]) cube([1, 1, 8], center=true);
    translate([13, 15, 3.5]) cube([1, 1, 7], center=true);
    translate([14, 0, 4.5]) cube([1, 1, 9], center=true);
    translate([14, 1, 4.5]) cube([1, 1, 9], center=true);
    translate([14, 2, 4.5]) cube([1, 1, 9], center=true);
    translate([14, 3, 4.5]) cube([1, 1, 9], center=true);
    translate([14, 4, 4.5]) cube([1, 1, 9], center=true);
    translate([14, 5, 4.5]) cube([1, 1, 9], center=true);
    translate([14, 6, 4.5]) cube([1, 1, 9], center=true);
    translate([14, 7, 4.5]) cube([1, 1, 9], center=true);
    translate([14, 8, 4.5]) cube([1, 1, 9], center=true);
    translate([14, 9, 4.5]) cube([1, 1, 9], center=true);
    translate([14, 10, 4.5]) cube([1, 1, 9], center=true);
    translate([14, 11, 4.5]) cube([1, 1, 9], center=true);
    translate([14, 12, 4.5]) cube([1, 1, 9], center=true);
    translate([14, 13, 4.5]) cube([1, 1, 9], center=true);
    translate([14, 14, 4.5]) cube([1, 1, 9], center=true);
}
